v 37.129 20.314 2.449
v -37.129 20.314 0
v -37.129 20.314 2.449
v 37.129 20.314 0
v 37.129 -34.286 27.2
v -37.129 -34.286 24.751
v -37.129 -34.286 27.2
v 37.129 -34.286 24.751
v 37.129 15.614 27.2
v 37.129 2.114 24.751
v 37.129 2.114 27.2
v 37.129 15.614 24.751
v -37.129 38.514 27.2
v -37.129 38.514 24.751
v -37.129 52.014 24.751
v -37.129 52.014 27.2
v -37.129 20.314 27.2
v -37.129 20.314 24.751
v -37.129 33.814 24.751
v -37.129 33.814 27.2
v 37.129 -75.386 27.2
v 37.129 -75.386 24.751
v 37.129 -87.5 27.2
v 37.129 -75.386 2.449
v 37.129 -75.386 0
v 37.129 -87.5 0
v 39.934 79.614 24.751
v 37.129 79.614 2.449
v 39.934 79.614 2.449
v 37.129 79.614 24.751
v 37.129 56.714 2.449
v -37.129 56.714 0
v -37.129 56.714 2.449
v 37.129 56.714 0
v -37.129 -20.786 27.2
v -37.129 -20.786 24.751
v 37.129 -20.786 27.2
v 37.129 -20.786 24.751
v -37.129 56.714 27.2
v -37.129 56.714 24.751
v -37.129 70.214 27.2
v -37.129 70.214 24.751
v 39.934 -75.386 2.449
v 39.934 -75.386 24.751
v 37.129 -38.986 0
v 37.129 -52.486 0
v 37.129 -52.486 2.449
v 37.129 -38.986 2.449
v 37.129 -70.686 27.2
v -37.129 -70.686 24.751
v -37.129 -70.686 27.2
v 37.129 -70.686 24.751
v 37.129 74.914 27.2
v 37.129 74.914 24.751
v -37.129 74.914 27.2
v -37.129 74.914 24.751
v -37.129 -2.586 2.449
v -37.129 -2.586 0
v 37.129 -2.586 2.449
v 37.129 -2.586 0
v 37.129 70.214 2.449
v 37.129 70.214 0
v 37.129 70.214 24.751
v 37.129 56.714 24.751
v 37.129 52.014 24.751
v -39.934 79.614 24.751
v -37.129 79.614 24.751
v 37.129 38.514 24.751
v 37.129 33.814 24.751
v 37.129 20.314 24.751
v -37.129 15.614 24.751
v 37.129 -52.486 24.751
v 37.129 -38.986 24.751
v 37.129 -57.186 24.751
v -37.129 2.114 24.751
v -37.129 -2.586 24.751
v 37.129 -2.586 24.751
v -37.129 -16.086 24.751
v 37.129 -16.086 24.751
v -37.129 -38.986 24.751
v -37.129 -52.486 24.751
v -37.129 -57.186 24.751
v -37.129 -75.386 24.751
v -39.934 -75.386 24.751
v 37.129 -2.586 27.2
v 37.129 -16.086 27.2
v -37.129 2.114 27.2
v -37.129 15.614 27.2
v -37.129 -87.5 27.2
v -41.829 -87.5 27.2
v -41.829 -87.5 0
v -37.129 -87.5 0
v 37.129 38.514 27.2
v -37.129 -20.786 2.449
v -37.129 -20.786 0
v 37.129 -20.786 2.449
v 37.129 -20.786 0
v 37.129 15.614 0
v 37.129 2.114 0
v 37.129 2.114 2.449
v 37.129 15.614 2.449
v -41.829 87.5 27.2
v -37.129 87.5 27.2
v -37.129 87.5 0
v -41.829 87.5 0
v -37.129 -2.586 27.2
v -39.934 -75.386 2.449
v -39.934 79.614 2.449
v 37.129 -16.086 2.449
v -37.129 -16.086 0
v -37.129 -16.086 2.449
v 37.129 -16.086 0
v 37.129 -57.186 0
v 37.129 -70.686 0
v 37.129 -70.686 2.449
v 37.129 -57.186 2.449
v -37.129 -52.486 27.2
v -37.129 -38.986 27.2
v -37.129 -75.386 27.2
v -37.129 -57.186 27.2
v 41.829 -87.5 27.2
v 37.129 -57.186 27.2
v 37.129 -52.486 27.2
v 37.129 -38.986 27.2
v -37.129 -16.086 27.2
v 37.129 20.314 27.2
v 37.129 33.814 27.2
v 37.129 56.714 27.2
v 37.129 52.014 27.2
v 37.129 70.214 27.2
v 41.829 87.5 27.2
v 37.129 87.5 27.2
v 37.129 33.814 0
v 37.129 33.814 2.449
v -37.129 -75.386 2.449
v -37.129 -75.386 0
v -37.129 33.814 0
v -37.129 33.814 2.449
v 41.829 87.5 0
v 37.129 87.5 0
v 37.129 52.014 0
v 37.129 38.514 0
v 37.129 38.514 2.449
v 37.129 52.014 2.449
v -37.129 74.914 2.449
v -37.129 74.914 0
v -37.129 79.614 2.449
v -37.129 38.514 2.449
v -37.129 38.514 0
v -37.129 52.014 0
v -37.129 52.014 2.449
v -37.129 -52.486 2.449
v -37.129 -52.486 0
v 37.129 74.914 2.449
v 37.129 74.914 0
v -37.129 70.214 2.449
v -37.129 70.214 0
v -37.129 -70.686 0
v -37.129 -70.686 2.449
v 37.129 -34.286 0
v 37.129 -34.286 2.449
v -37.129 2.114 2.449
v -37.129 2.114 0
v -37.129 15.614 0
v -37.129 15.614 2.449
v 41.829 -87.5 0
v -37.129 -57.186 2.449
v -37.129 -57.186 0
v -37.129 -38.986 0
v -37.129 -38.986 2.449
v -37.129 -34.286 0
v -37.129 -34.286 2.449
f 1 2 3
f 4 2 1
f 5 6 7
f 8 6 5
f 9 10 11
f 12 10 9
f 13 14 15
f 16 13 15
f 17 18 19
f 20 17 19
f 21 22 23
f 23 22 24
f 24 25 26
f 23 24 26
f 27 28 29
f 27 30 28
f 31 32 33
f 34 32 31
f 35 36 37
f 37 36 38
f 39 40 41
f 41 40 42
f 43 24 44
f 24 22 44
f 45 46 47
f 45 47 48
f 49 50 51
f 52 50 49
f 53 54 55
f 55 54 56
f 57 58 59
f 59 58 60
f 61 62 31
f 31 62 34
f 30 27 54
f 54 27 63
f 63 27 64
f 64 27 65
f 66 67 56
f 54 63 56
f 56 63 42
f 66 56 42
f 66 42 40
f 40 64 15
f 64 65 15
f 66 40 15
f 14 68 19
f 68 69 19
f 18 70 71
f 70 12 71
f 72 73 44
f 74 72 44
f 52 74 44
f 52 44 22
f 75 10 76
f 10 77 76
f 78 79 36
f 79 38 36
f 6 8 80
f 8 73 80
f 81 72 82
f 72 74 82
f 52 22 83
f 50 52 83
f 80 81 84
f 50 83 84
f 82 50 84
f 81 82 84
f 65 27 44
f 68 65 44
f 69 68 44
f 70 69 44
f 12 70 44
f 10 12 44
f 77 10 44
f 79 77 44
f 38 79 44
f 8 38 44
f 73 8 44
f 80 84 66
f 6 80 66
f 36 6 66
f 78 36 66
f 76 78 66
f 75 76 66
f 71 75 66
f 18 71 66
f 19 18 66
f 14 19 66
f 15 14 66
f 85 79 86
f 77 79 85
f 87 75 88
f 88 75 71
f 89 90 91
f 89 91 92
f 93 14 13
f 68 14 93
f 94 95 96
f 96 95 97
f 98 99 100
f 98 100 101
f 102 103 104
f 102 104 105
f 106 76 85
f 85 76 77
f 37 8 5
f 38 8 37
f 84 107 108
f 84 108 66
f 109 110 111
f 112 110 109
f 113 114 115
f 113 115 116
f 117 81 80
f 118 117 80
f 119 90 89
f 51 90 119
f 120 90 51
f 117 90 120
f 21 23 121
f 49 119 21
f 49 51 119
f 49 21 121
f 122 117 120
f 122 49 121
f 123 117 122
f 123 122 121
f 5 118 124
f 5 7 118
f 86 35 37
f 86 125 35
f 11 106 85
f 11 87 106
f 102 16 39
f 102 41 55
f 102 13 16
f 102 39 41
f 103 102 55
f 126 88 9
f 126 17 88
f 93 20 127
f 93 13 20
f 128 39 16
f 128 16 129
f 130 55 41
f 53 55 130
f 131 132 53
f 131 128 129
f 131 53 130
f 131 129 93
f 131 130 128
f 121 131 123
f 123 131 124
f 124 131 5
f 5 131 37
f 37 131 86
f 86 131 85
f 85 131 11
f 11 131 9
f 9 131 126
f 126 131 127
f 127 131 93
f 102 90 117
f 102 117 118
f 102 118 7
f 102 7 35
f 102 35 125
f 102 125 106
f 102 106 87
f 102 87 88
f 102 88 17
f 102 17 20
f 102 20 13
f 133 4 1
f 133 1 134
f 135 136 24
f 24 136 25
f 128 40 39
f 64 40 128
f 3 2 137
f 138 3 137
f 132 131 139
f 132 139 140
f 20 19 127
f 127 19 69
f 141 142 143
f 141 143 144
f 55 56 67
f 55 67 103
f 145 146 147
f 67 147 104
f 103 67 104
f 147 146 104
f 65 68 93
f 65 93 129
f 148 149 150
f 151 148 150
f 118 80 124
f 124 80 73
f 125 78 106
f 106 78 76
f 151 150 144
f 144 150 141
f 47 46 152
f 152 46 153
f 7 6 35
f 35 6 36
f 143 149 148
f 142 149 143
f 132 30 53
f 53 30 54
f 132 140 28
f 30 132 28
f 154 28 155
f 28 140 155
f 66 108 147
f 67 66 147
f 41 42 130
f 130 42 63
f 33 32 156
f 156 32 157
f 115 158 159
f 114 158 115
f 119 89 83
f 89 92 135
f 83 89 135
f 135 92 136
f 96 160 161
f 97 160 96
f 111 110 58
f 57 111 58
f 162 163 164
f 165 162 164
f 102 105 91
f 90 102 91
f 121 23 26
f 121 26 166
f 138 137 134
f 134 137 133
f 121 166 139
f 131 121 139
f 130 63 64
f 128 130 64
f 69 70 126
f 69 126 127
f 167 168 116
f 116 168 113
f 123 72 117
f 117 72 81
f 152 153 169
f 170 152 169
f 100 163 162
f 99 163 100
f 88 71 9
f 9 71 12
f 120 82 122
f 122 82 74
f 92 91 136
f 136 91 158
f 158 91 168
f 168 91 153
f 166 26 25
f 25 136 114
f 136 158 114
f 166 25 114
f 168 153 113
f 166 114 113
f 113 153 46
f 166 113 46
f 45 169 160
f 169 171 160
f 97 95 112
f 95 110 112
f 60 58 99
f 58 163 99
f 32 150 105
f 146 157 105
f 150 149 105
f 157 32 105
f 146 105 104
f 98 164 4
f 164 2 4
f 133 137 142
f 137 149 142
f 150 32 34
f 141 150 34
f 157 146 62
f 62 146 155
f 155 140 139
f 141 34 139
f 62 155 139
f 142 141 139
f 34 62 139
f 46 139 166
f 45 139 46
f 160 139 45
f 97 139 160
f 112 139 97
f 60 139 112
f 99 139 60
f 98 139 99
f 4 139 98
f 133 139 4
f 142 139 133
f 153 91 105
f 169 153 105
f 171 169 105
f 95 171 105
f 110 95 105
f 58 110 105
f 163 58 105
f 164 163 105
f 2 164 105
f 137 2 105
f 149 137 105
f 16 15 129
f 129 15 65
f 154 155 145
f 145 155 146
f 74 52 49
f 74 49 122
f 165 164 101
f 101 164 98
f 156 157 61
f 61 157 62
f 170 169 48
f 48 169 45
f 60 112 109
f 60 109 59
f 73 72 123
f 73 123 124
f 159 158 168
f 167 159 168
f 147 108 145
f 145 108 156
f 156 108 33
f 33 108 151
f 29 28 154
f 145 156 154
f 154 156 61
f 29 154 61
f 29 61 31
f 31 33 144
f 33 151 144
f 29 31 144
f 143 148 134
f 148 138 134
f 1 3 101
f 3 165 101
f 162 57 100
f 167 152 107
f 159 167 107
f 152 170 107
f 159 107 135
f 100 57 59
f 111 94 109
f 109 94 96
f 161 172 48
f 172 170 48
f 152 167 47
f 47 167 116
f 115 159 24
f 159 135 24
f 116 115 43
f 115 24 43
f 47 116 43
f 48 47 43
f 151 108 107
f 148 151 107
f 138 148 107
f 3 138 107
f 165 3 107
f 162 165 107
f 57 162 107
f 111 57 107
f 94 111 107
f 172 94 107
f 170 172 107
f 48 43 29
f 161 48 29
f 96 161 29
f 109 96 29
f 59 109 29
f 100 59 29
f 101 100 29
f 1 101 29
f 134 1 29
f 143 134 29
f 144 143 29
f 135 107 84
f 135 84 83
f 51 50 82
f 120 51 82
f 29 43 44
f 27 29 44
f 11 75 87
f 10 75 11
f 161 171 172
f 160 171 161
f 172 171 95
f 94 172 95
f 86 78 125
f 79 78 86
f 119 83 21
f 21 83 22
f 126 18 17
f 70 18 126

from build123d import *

# Parameters (mm, degrees)
F0_W     = 74.25791291
F0_H     = 4.7
F0_W_2   = 3.271043545
F0_W_3   = 1.428956455
F0_H_2   = 8.3906837511
F0_H_3   = 13.5
F0_H_4   = 7.9193162489
F1_DEPTH = 27.2
F2_W     = 39.9343147874
F2_H     = 22.3026155613
F3_DEPTH = 155


with BuildPart() as f1:
    # F0 (on Top) → F1 (new body)
    with BuildSketch(Plane.XY):
        Polygon((-41.828956455, 87.5000014901), (-41.828956455, 74.9143162489), (-40.4, 74.9143162489), (-40.4, 83.305), (-37.128956455, 83.305), (-37.128956455, 87.5000014901), align=None)
        with Locations((0, 72.5643162489)):
            Rectangle(F0_W, F0_H)
        with Locations((-38.7644782275, 72.5643162489)):
            Rectangle(F0_W_2, F0_H)
        with Locations((-41.1144782275, 72.5643162489)):
            Rectangle(F0_W_3, F0_H)
        with Locations((38.7644782275, 79.1096581244)):
            Rectangle(F0_W_2, F0_H_2)
        Polygon((37.128956455, 87.5000014901), (37.128956455, 83.305), (40.4, 83.305), (40.4, 74.9143162489), (41.828956455, 74.9143162489), (41.828956455, 87.5000014901), align=None)
        with Locations((38.7644782275, 72.5643162489)):
            Rectangle(F0_W_2, F0_H)
        with Locations((41.1144782275, 72.5643162489)):
            Rectangle(F0_W_3, F0_H)
        with Locations((-41.1144782275, 63.4643162489)):
            Rectangle(F0_W_3, F0_H_3)
        with Locations((-38.7644782275, 63.4643162489)):
            Rectangle(F0_W_2, F0_H_3)
        with Locations((38.7644782275, 63.4643162489)):
            Rectangle(F0_W_2, F0_H_3)
        with Locations((41.1144782275, 63.4643162489)):
            Rectangle(F0_W_3, F0_H_3)
        with Locations((41.1144782275, 54.3643162489)):
            Rectangle(F0_W_3, F0_H)
        with Locations((38.7644782275, 54.3643162489)):
            Rectangle(F0_W_2, F0_H)
        with Locations((0, 54.3643162489)):
            Rectangle(F0_W, F0_H)
        with Locations((-41.1144782275, 54.3643162489)):
            Rectangle(F0_W_3, F0_H)
        with Locations((-38.7644782275, 54.3643162489)):
            Rectangle(F0_W_2, F0_H)
        with Locations((-41.1144782275, 45.2643162489)):
            Rectangle(F0_W_3, F0_H_3)
        with Locations((-38.7644782275, 45.2643162489)):
            Rectangle(F0_W_2, F0_H_3)
        with Locations((38.7644782275, 45.2643162489)):
            Rectangle(F0_W_2, F0_H_3)
        with Locations((41.1144782275, 45.2643162489)):
            Rectangle(F0_W_3, F0_H_3)
        with Locations((-41.1144782275, 36.1643162489)):
            Rectangle(F0_W_3, F0_H)
        with Locations((-38.7644782275, 36.1643162489)):
            Rectangle(F0_W_2, F0_H)
        with Locations((0, 36.1643162489)):
            Rectangle(F0_W, F0_H)
        with Locations((38.7644782275, 36.1643162489)):
            Rectangle(F0_W_2, F0_H)
        with Locations((41.1144782275, 36.1643162489)):
            Rectangle(F0_W_3, F0_H)
        with Locations((-41.1144782275, 27.0643162489)):
            Rectangle(F0_W_3, F0_H_3)
        with Locations((-38.7644782275, 27.0643162489)):
            Rectangle(F0_W_2, F0_H_3)
        with Locations((38.7644782275, 27.0643162489)):
            Rectangle(F0_W_2, F0_H_3)
        with Locations((41.1144782275, 27.0643162489)):
            Rectangle(F0_W_3, F0_H_3)
        with Locations((-41.1144782275, 17.9643162489)):
            Rectangle(F0_W_3, F0_H)
        with Locations((-38.7644782275, 17.9643162489)):
            Rectangle(F0_W_2, F0_H)
        with Locations((0, 17.9643162489)):
            Rectangle(F0_W, F0_H)
        with Locations((38.7644782275, 17.9643162489)):
            Rectangle(F0_W_2, F0_H)
        with Locations((41.1144782275, 17.9643162489)):
            Rectangle(F0_W_3, F0_H)
        with Locations((-41.1144782275, 8.8643162489)):
            Rectangle(F0_W_3, F0_H_3)
        with Locations((-38.7644782275, 8.8643162489)):
            Rectangle(F0_W_2, F0_H_3)
        with Locations((-41.1144782275, -0.2356837511)):
            Rectangle(F0_W_3, F0_H)
        with Locations((-38.7644782275, -0.2356837511)):
            Rectangle(F0_W_2, F0_H)
        with Locations((0, -0.2356837511)):
            Rectangle(F0_W, F0_H)
        with Locations((38.7644782275, 8.8643162489)):
            Rectangle(F0_W_2, F0_H_3)
        with Locations((41.1144782275, 8.8643162489)):
            Rectangle(F0_W_3, F0_H_3)
        with Locations((38.7644782275, -0.2356837511)):
            Rectangle(F0_W_2, F0_H)
        with Locations((41.1144782275, -0.2356837511)):
            Rectangle(F0_W_3, F0_H)
        with Locations((-41.1144782275, -9.3356837511)):
            Rectangle(F0_W_3, F0_H_3)
        with Locations((-38.7644782275, -9.3356837511)):
            Rectangle(F0_W_2, F0_H_3)
        with Locations((-41.1144782275, -18.4356837511)):
            Rectangle(F0_W_3, F0_H)
        with Locations((-38.7644782275, -18.4356837511)):
            Rectangle(F0_W_2, F0_H)
        with Locations((0, -18.4356837511)):
            Rectangle(F0_W, F0_H)
        with Locations((38.7644782275, -9.3356837511)):
            Rectangle(F0_W_2, F0_H_3)
        with Locations((41.1144782275, -9.3356837511)):
            Rectangle(F0_W_3, F0_H_3)
        with Locations((38.7644782275, -18.4356837511)):
            Rectangle(F0_W_2, F0_H)
        with Locations((41.1144782275, -18.4356837511)):
            Rectangle(F0_W_3, F0_H)
        with Locations((-41.1144782275, -27.5356837511)):
            Rectangle(F0_W_3, F0_H_3)
        with Locations((-38.7644782275, -27.5356837511)):
            Rectangle(F0_W_2, F0_H_3)
        with Locations((38.7644782275, -27.5356837511)):
            Rectangle(F0_W_2, F0_H_3)
        with Locations((41.1144782275, -27.5356837511)):
            Rectangle(F0_W_3, F0_H_3)
        with Locations((-41.1144782275, -36.6356837511)):
            Rectangle(F0_W_3, F0_H)
        with Locations((-38.7644782275, -36.6356837511)):
            Rectangle(F0_W_2, F0_H)
        with Locations((0, -36.6356837511)):
            Rectangle(F0_W, F0_H)
        with Locations((38.7644782275, -36.6356837511)):
            Rectangle(F0_W_2, F0_H)
        with Locations((41.1144782275, -36.6356837511)):
            Rectangle(F0_W_3, F0_H)
        with Locations((-41.1144782275, -45.7356837511)):
            Rectangle(F0_W_3, F0_H_3)
        with Locations((-38.7644782275, -45.7356837511)):
            Rectangle(F0_W_2, F0_H_3)
        with Locations((-41.1144782275, -54.8356837511)):
            Rectangle(F0_W_3, F0_H)
        with Locations((-38.7644782275, -54.8356837511)):
            Rectangle(F0_W_2, F0_H)
        with Locations((0, -54.8356837511)):
            Rectangle(F0_W, F0_H)
        with Locations((38.7644782275, -54.8356837511)):
            Rectangle(F0_W_2, F0_H)
        with Locations((41.1144782275, -54.8356837511)):
            Rectangle(F0_W_3, F0_H)
        with Locations((38.7644782275, -45.7356837511)):
            Rectangle(F0_W_2, F0_H_3)
        with Locations((41.1144782275, -45.7356837511)):
            Rectangle(F0_W_3, F0_H_3)
        with Locations((-41.1144782275, -63.9356837511)):
            Rectangle(F0_W_3, F0_H_3)
        with Locations((-38.7644782275, -63.9356837511)):
            Rectangle(F0_W_2, F0_H_3)
        with Locations((38.7644782275, -63.9356837511)):
            Rectangle(F0_W_2, F0_H_3)
        with Locations((41.1144782275, -63.9356837511)):
            Rectangle(F0_W_3, F0_H_3)
        with Locations((-41.1144782275, -73.0356837511)):
            Rectangle(F0_W_3, F0_H)
        with Locations((-38.7644782275, -73.0356837511)):
            Rectangle(F0_W_2, F0_H)
        with Locations((0, -73.0356837511)):
            Rectangle(F0_W, F0_H)
        with Locations((38.7644782275, -73.0356837511)):
            Rectangle(F0_W_2, F0_H)
        with Locations((41.1144782275, -73.0356837511)):
            Rectangle(F0_W_3, F0_H)
        Polygon((-41.828956455, -87.4999985099), (-37.128956455, -87.4999985099), (-37.128956455, -83.305), (-40.4, -83.305), (-40.4, -75.3856837511), (-41.828956455, -75.3856837511), align=None)
        with Locations((-38.7644782275, -79.3453418756)):
            Rectangle(F0_W_2, F0_H_4)
        with Locations((38.7644782275, -79.3453418756)):
            Rectangle(F0_W_2, F0_H_4)
        Polygon((40.4, -83.305), (37.128956455, -83.305), (37.128956455, -87.4999985099), (41.828956455, -87.4999985099), (41.828956455, -75.3856837511), (40.4, -75.3856837511), align=None)
        with Locations((-38.7644782275, 79.1096581244)):
            Rectangle(F0_W_2, F0_H_2)
    extrude(amount=F1_DEPTH)

    # F2 (on face) → F3 (cut)
    with BuildSketch(Plane.XZ.offset(75.3856837511)):
        with Locations((19.9671573937, 13.6)):
            Rectangle(F2_W, F2_H)
        with Locations((-19.9671573937, 13.6)):
            Rectangle(F2_W, F2_H)
    extrude(amount=-F3_DEPTH, mode=Mode.SUBTRACT)


solid = f1.part
